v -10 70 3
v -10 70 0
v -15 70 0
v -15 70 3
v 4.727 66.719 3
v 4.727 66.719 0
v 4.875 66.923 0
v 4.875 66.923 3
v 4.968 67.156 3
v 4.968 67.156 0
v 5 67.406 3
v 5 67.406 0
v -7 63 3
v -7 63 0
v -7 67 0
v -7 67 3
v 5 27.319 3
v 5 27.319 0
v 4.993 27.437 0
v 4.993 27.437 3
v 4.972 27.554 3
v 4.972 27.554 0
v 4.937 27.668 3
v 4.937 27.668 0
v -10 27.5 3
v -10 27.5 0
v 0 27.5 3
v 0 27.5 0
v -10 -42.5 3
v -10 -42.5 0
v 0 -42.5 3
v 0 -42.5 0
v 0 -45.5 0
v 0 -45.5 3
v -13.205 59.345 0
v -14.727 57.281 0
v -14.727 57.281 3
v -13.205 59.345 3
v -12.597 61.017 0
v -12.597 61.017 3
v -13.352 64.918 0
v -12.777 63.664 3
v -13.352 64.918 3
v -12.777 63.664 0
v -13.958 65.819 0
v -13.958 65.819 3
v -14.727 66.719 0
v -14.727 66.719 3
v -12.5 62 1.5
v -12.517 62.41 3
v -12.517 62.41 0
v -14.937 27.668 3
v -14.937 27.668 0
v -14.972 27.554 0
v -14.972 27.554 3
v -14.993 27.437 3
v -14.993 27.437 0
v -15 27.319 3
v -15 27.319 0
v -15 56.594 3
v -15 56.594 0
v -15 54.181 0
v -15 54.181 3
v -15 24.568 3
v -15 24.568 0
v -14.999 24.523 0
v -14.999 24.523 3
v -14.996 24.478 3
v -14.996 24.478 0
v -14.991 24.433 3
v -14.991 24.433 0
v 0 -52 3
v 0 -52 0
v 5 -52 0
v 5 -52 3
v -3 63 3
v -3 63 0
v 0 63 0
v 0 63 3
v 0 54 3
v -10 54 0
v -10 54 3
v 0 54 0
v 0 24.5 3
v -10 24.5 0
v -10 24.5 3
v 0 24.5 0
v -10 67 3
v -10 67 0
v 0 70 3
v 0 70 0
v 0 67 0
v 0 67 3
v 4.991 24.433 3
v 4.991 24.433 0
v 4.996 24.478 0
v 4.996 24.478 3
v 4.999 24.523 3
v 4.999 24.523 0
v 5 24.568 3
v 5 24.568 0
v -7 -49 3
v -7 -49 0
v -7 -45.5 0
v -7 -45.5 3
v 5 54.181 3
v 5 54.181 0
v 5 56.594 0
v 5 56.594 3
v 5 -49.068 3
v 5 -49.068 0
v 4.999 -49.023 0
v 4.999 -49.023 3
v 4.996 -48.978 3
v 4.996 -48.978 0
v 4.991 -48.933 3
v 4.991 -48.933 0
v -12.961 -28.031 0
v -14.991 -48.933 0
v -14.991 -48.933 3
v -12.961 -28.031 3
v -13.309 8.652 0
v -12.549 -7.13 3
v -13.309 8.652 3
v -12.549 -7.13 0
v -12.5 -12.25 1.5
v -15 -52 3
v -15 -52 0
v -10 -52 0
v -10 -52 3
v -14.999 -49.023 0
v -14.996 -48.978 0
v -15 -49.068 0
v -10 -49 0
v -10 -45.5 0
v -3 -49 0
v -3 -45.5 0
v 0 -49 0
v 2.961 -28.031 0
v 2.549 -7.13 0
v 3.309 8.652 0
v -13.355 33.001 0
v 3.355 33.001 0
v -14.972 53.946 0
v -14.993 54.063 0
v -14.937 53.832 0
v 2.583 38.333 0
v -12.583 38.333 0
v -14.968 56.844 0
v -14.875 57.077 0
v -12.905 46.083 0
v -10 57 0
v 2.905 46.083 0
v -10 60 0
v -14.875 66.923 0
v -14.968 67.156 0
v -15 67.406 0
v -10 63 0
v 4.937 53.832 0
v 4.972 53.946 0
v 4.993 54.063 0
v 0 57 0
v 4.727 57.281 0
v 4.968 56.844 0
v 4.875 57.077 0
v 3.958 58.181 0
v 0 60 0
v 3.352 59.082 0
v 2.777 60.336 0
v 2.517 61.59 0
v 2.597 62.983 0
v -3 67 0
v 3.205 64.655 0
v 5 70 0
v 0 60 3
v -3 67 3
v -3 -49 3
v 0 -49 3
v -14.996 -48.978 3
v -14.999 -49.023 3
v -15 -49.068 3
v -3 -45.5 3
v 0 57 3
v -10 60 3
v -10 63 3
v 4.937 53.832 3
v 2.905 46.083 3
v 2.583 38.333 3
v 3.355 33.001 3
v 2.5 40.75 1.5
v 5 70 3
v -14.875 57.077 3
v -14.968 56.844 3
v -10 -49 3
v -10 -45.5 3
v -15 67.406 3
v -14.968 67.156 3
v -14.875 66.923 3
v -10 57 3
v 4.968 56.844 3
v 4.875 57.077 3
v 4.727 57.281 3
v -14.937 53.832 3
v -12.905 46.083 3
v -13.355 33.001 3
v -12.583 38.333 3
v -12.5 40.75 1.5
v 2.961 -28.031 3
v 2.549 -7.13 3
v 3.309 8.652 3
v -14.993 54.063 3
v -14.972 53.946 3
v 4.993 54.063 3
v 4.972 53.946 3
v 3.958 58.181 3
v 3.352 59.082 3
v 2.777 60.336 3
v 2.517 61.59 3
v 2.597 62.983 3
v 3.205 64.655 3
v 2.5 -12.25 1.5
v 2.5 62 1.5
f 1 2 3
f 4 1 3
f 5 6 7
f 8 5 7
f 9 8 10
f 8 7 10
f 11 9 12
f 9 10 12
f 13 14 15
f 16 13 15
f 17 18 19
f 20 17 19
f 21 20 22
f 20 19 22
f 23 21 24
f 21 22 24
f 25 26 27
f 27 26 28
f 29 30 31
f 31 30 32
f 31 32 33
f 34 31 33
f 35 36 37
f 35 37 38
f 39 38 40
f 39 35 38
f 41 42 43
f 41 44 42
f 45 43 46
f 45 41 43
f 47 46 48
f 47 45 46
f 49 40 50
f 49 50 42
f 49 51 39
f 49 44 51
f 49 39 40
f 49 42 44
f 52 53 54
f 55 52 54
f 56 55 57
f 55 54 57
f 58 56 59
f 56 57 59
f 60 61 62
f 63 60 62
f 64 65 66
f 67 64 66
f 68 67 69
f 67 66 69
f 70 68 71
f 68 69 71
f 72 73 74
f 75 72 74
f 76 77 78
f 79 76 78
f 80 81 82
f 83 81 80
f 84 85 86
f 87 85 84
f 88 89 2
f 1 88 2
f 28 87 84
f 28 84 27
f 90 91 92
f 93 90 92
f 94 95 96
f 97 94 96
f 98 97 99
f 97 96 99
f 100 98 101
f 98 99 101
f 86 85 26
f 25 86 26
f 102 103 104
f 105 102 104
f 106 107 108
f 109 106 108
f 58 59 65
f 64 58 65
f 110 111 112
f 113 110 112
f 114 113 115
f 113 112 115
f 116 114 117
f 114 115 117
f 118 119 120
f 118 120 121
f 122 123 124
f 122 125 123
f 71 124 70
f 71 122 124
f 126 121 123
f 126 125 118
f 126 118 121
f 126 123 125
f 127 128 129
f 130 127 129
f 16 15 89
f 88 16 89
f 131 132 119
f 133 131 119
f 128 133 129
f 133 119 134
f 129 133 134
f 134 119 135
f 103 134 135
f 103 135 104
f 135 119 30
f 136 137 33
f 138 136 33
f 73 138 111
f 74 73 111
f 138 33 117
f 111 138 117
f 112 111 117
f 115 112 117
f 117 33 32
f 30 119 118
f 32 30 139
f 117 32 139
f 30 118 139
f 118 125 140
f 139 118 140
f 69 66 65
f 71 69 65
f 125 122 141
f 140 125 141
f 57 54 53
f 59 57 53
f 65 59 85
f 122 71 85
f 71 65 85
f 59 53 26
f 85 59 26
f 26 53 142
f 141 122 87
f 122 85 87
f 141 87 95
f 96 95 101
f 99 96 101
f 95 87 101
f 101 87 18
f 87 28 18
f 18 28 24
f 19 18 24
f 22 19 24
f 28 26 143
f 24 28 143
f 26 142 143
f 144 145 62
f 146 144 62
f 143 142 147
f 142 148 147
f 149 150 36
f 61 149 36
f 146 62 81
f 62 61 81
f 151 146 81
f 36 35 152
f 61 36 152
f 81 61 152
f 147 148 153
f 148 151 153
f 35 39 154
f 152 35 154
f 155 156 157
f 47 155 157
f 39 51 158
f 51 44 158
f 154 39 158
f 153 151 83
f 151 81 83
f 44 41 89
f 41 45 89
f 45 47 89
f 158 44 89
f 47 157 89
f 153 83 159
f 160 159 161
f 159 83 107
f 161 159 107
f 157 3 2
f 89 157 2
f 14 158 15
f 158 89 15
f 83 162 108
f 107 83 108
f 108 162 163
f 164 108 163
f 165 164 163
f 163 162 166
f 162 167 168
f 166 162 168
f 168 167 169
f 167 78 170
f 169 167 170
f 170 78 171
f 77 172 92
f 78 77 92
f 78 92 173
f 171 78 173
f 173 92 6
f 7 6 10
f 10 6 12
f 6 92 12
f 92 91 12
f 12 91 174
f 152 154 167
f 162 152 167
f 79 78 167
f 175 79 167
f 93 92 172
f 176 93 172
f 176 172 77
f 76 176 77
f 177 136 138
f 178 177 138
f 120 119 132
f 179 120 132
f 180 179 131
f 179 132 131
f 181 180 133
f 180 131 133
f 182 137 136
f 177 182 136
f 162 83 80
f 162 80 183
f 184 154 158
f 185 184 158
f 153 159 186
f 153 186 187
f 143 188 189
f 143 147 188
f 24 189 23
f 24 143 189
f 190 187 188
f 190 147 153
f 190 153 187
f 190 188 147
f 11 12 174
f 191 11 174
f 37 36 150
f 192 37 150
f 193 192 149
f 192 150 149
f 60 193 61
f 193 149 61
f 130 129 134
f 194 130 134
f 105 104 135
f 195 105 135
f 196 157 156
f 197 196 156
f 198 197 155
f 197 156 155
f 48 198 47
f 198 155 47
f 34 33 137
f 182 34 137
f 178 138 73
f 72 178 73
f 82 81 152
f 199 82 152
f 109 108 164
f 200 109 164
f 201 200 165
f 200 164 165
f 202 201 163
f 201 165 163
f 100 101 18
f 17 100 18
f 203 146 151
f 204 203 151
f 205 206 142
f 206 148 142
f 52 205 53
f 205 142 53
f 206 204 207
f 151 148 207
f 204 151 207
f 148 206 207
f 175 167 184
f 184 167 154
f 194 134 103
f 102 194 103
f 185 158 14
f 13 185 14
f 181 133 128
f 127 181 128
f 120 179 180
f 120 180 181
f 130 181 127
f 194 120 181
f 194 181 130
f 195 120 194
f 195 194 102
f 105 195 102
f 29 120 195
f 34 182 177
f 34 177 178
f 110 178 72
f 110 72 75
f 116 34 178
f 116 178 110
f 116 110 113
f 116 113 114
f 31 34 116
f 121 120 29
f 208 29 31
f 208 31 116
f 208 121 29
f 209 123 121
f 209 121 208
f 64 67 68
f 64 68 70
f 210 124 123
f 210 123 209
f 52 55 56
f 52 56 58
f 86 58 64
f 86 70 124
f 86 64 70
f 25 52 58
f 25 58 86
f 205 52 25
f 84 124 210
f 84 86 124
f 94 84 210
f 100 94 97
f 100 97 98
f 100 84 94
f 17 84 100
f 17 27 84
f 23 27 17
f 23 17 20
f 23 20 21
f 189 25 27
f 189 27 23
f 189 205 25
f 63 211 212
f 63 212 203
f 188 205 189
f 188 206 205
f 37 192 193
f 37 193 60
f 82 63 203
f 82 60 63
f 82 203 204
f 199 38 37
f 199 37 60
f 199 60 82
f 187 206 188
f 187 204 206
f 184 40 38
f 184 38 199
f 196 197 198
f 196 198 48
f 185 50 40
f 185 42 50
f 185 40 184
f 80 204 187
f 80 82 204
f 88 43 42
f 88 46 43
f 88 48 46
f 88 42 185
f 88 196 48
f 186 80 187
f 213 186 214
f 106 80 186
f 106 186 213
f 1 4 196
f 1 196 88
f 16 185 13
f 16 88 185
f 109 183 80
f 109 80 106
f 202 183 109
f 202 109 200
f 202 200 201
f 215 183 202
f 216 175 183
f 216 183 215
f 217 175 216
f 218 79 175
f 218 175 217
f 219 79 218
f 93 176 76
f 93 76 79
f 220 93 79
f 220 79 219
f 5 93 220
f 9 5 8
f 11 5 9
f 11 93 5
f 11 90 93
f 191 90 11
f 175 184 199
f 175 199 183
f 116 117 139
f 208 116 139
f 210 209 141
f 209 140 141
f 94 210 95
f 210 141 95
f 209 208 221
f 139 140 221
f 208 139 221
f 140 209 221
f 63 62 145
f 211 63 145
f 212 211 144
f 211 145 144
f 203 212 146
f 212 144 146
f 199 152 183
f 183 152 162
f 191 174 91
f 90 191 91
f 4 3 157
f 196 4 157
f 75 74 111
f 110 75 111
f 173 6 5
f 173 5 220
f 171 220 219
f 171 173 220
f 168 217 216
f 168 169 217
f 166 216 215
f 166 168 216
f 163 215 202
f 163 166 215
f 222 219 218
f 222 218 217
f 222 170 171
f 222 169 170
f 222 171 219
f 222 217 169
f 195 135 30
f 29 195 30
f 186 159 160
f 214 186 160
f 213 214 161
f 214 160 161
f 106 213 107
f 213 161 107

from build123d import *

# Parameters (mm, degrees)
CROQUIS1_W              = 10
CROQUIS1_H              = 3
SALIENTE_EXTRUIR1_DEPTH = 3


with BuildPart() as part:
    # Croquis1 → Saliente-Extruir1 (new body)
    with BuildSketch(Plane.XY):
        with BuildLine():
            Line((-0.5, 63), (0, 63))
            Line((0, 63), (0, 60))
            Line((0, 60), (-0.5, 60))
            Line((-0.5, 60), (-9.5, 60))
            Line((-9.5, 60), (-10, 60))
            Line((-10, 60), (-10, 63))
            Line((-10, 63), (-9.5, 63))
            Line((-9.5, 63), (-7, 63))
            Line((-7, 63), (-7, 67))
            Line((-7, 67), (-10, 67))
            Line((-10, 67), (-10, 70))
            Line((-10, 70), (-15, 70))
            Line((-15, 70), (-15, 67.405747627))
            ThreePointArc((-15, 67.405747627), (-14.929306729, 67.036438809), (-14.727221995, 66.719345288))
            add(Edge.make_bspline(
                [(-14.727221995, 57.280654712), (-13.242407332, 58.853769808), (-11.757592668, 62), (-13.242407332, 65.146230192), (-14.727221995, 66.719345288)],
                knots=[0.028065471, 0.028065471, 0.028065471, 0.028065471, 0.5, 0.971934529, 0.971934529, 0.971934529, 0.971934529], degree=3))
            ThreePointArc((-14.727221995, 57.280654712), (-14.929306729, 56.963561191), (-15, 56.594252373))
            Line((-15, 56.594252373), (-15, 54.181314171))
            ThreePointArc((-15, 54.181314171), (-14.9841425, 54.003934523), (-14.937072921, 53.832180471))
            add(Edge.make_bspline(
                [(-14.937072921, 53.832180471), (-13.31235764, 49.471453647), (-11.68764236, 40.75), (-13.31235764, 32.028546353), (-14.937072921, 27.667819529)],
                knots=[0.006332812, 0.006332812, 0.006332812, 0.006332812, 0.5, 0.993667188, 0.993667188, 0.993667188, 0.993667188], degree=3))
            ThreePointArc((-14.937072921, 27.667819529), (-14.9841425, 27.496065477), (-15, 27.318685829))
            Line((-15, 27.318685829), (-15, 24.567654138))
            ThreePointArc((-15, 24.567654138), (-14.997723384, 24.500214919), (-14.990903903, 24.433082766))
            add(Edge.make_bspline(
                [(-14.990903903, -48.933082766), (-13.330301301, -36.70538851), (-11.669698699, -12.25), (-13.330301301, 12.20538851), (-14.990903903, 24.433082766)],
                knots=[0.000910439, 0.000910439, 0.000910439, 0.000910439, 0.5, 0.999089561, 0.999089561, 0.999089561, 0.999089561], degree=3))
            ThreePointArc((-14.990903903, -48.933082766), (-14.997723384, -49.000214919), (-15, -49.067654138))
            Line((-15, -49.067654138), (-15, -51.701381229))
            Line((-15, -51.701381229), (-15, -52))
            Line((-15, -52), (-10, -52))
            Line((-10, -52), (-10, -49))
            Line((-10, -49), (-7, -49))
            Line((-7, -49), (-7, -45.5))
            Line((-7, -45.5), (-9.5, -45.5))
            Line((-9.5, -45.5), (-10, -45.5))
            Line((-10, -45.5), (-10, -42.5))
            Line((-10, -42.5), (-9.5, -42.5))
            Line((-9.5, -42.5), (-0.5, -42.5))
            Line((-0.5, -42.5), (0, -42.5))
            Line((0, -42.5), (0, -45.5))
            Line((0, -45.5), (-0.5, -45.5))
            Line((-0.5, -45.5), (-3, -45.5))
            Line((-3, -45.5), (-3, -49))
            Line((-3, -49), (0, -49))
            Line((0, -49), (0, -52))
            Line((0, -52), (5, -52))
            Line((5, -52), (5, -51.701381229))
            Line((5, -51.701381229), (5, -49.067654138))
            ThreePointArc((5, -49.067654138), (4.997723384, -49.000214919), (4.990903903, -48.933082766))
            add(Edge.make_bspline(
                [(4.990903903, -48.933082766), (3.330301301, -36.70538851), (1.669698699, -12.25), (3.330301301, 12.20538851), (4.990903903, 24.433082766)],
                knots=[0.000910439, 0.000910439, 0.000910439, 0.000910439, 0.5, 0.999089561, 0.999089561, 0.999089561, 0.999089561], degree=3))
            ThreePointArc((4.990903903, 24.433082766), (4.997723384, 24.500214919), (5, 24.567654138))
            Line((5, 24.567654138), (5, 27.318685829))
            ThreePointArc((5, 27.318685829), (4.9841425, 27.496065477), (4.937072921, 27.667819529))
            add(Edge.make_bspline(
                [(4.937072921, 53.832180471), (3.31235764, 49.471453647), (1.68764236, 40.75), (3.31235764, 32.028546353), (4.937072921, 27.667819529)],
                knots=[0.006332812, 0.006332812, 0.006332812, 0.006332812, 0.5, 0.993667188, 0.993667188, 0.993667188, 0.993667188], degree=3))
            ThreePointArc((4.937072921, 53.832180471), (4.9841425, 54.003934523), (5, 54.181314171))
            Line((5, 54.181314171), (5, 56.594252373))
            ThreePointArc((5, 56.594252373), (4.929306729, 56.963561191), (4.727221995, 57.280654712))
            add(Edge.make_bspline(
                [(4.727221995, 66.719345288), (3.242407332, 65.146230192), (1.757592668, 62), (3.242407332, 58.853769808), (4.727221995, 57.280654712)],
                knots=[0.028065471, 0.028065471, 0.028065471, 0.028065471, 0.5, 0.971934529, 0.971934529, 0.971934529, 0.971934529], degree=3))
            ThreePointArc((4.727221995, 66.719345288), (4.929306729, 67.036438809), (5, 67.405747627))
            Line((5, 67.405747627), (5, 70))
            Line((5, 70), (0, 70))
            Line((0, 70), (0, 67))
            Line((0, 67), (-3, 67))
            Line((-3, 67), (-3, 63))
            Line((-3, 63), (-0.5, 63))
        make_face()
        with Locations((-5, 26)):
            Rectangle(CROQUIS1_W, CROQUIS1_H, mode=Mode.SUBTRACT)
        with Locations((-5, 55.5)):
            Rectangle(CROQUIS1_W, CROQUIS1_H, mode=Mode.SUBTRACT)
    extrude(amount=SALIENTE_EXTRUIR1_DEPTH)


solid = part.part
